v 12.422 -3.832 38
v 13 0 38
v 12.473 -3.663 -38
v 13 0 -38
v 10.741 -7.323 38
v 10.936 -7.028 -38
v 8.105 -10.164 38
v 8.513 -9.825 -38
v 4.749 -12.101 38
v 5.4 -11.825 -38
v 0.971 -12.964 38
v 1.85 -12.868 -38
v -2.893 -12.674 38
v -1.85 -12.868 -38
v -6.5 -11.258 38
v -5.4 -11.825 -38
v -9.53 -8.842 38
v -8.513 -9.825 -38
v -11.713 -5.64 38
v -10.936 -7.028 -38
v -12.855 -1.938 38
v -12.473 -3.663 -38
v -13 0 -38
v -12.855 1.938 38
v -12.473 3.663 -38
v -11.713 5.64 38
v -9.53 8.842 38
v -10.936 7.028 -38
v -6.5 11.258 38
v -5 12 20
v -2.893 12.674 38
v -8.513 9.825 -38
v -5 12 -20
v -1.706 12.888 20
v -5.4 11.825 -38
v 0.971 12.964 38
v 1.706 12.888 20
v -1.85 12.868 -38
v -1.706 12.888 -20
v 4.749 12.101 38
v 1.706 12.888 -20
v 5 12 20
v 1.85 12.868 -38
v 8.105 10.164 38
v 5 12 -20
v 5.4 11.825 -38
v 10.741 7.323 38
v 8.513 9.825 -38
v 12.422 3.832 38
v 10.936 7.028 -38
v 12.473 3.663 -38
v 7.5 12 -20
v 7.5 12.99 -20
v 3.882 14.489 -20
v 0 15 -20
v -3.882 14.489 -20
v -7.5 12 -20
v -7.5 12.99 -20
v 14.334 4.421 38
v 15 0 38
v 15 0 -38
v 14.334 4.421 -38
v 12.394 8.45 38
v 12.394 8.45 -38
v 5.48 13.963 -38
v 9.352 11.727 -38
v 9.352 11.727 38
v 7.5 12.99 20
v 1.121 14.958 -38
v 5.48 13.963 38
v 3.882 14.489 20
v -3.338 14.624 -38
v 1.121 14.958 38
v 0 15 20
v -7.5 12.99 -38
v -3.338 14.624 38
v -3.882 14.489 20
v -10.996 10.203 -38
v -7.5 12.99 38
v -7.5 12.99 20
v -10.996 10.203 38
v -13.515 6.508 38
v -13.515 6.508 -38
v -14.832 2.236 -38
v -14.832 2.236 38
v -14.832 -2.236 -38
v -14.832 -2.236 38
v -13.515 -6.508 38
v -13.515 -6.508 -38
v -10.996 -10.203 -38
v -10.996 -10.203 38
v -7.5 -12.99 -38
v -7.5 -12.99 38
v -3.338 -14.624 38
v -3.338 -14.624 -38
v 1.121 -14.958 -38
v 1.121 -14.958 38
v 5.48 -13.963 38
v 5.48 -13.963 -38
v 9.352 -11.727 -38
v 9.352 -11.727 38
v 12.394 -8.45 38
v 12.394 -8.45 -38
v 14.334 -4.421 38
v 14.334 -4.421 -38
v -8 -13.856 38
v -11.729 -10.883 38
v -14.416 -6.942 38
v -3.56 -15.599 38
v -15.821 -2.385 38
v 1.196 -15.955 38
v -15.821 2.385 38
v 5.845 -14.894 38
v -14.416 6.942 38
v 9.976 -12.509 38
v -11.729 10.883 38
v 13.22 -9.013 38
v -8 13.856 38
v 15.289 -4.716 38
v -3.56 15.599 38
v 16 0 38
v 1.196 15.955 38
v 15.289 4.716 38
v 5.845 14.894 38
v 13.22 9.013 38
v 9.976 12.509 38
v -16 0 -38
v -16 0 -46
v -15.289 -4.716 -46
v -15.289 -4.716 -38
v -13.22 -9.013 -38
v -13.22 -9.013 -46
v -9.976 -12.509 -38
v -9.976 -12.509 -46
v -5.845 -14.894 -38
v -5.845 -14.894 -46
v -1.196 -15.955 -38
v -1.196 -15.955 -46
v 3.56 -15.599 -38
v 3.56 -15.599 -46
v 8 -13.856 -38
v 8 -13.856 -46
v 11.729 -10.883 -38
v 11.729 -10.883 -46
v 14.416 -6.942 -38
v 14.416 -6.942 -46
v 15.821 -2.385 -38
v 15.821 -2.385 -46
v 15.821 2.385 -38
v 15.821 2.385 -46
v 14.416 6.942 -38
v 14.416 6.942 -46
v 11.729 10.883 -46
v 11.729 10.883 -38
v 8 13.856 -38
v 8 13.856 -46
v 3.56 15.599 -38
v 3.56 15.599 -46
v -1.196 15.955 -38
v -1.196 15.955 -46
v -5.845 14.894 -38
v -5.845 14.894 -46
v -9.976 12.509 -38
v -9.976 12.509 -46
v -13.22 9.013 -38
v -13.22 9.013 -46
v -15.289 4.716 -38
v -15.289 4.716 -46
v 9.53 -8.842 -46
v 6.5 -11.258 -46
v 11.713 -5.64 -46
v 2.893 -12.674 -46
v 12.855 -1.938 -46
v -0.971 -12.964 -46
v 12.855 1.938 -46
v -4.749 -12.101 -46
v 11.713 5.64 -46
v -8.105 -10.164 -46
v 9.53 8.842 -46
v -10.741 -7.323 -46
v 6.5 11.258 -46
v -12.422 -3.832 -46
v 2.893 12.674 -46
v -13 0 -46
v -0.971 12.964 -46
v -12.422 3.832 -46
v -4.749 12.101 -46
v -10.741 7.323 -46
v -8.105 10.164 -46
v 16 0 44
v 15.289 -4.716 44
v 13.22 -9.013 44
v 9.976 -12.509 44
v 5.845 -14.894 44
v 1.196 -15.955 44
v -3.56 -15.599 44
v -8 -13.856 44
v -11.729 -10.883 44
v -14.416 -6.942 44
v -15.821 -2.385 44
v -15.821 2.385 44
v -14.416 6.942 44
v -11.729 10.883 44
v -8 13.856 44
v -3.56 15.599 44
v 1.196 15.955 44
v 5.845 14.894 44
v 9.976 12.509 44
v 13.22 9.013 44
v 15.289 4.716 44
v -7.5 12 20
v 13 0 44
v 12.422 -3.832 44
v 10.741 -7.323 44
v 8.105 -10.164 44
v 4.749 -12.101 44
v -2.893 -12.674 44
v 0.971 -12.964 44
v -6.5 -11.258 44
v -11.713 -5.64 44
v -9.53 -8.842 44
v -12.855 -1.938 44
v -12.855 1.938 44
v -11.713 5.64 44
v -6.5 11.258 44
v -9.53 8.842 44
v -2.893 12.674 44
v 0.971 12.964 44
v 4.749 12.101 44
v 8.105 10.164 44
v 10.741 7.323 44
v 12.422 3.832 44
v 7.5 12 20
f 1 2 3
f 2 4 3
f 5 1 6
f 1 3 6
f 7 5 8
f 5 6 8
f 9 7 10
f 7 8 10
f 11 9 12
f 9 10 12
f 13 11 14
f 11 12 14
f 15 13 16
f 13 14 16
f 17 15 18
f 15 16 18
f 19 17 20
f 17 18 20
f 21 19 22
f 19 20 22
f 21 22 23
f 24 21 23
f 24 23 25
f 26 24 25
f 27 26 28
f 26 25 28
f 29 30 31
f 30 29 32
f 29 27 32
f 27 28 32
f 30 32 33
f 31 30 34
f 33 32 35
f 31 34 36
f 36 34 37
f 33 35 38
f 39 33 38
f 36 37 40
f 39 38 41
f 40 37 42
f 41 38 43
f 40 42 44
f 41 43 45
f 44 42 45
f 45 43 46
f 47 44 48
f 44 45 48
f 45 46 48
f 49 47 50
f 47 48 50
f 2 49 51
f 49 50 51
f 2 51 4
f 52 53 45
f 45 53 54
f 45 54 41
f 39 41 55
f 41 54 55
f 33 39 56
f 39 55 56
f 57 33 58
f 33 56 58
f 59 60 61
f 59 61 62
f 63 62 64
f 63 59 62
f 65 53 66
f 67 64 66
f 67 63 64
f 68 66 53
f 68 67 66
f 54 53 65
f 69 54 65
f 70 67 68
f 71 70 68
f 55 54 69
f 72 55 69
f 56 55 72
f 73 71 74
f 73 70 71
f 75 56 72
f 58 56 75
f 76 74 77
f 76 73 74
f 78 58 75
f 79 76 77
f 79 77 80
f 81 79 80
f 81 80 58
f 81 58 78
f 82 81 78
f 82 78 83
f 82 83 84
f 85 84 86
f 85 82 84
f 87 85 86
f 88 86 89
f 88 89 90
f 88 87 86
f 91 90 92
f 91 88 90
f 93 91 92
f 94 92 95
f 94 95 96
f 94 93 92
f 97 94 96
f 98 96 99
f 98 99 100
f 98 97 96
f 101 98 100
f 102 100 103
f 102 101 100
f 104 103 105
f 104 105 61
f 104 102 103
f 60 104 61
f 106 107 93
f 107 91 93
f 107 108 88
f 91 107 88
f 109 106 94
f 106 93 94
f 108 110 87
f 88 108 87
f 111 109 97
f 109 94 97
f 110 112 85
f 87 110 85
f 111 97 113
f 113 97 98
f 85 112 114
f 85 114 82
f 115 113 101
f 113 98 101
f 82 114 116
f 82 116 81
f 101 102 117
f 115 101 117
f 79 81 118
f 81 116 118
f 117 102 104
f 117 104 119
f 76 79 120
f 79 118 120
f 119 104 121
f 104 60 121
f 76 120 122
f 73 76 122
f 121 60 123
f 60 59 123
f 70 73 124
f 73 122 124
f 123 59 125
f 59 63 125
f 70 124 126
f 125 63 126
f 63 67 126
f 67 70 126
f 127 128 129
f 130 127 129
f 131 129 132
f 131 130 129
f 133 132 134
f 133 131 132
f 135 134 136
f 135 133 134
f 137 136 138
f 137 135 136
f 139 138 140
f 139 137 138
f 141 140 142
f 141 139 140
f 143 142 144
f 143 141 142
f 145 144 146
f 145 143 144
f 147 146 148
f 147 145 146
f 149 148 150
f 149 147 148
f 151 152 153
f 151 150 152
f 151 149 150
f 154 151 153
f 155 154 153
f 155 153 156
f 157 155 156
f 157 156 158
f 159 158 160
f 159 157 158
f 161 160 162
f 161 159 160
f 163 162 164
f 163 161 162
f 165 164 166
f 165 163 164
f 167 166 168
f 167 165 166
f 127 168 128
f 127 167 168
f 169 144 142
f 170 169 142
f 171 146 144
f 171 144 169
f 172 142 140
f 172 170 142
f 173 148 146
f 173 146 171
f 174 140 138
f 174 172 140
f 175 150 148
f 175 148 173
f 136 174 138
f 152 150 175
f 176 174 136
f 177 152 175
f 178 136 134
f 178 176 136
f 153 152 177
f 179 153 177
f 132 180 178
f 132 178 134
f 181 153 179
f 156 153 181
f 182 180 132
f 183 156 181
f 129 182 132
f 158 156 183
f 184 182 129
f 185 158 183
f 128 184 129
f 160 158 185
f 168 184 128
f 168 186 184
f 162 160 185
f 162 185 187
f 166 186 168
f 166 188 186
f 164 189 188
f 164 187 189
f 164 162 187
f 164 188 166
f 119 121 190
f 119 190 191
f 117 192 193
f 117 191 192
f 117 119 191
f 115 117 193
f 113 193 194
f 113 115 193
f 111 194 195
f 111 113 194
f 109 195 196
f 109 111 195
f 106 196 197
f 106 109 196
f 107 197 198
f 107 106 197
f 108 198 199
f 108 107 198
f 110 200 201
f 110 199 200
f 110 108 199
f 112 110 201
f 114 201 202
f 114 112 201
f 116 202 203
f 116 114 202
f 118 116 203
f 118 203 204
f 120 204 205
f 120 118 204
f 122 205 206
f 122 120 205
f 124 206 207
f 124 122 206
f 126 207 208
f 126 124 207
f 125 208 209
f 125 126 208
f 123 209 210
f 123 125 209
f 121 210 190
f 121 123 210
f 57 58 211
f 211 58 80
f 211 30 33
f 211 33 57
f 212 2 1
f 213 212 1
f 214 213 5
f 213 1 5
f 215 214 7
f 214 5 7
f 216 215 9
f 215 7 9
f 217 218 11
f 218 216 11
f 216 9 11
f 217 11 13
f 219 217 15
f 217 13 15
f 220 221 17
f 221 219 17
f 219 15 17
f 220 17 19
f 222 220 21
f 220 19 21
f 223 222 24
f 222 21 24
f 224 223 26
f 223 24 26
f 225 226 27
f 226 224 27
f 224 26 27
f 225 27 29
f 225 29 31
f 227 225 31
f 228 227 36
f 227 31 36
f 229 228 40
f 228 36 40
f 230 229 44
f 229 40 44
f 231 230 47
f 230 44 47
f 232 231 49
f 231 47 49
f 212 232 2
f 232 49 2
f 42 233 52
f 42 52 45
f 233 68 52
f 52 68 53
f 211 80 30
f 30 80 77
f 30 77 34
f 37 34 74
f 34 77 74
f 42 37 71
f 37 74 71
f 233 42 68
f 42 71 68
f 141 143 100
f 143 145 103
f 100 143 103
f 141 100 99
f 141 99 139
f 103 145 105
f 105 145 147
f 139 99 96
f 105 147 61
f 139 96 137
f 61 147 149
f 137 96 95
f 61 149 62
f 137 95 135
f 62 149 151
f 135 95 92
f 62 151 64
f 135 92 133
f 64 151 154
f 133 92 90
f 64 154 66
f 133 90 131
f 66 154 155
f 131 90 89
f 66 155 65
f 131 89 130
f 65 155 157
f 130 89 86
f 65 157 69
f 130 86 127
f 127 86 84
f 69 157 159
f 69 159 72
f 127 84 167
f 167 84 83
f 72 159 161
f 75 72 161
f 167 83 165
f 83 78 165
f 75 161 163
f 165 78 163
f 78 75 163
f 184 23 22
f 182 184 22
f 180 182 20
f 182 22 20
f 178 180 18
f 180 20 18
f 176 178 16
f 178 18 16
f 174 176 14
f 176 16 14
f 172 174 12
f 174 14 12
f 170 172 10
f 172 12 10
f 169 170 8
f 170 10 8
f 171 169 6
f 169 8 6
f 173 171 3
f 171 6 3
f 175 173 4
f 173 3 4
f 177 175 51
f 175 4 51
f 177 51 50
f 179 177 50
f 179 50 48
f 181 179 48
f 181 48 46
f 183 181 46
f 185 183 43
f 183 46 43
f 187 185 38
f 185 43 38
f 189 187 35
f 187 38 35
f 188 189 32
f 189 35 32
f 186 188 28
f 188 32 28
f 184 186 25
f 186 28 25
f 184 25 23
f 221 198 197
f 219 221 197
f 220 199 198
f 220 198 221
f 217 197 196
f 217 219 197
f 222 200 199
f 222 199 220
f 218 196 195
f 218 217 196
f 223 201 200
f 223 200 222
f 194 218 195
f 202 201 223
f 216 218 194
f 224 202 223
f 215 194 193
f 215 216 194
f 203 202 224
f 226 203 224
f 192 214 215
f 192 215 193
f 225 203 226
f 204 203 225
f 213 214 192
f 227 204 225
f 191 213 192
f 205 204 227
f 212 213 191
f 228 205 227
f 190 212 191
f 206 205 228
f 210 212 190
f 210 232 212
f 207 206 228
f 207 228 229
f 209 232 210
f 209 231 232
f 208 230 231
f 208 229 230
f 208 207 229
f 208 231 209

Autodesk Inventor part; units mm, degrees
ref_plane "YZ Plane" through (0, 0, 0) normal (1, 0, 0) x (0, 1, 0)
ref_plane "XY Plane" through (0, 0, 0) normal (0, 0, 1) x (1, 0, 0)
sketch "Sketch1" plane through (0, 0, 0) normal (0, 1, 0) x (-1, 0, 0)
  line L0 (-12.6, 0) -> (-15.4, 0) projected
  line L1 (0, -53.2) -> (0, 53.2) projected
  line L2 (-13, -38) -> (-15, -38)
  line L3 (-15, -38) -> (-15, 38)
  line L4 (-15, 38) -> (-13, 38)
  line L5 (-13, 38) -> (-13, -38)
  line L6 (-13, -38) -> (-15, 38) construction
  line L7 (-15, -38) -> (-13, 38) construction
  point P0 (-14, 0)
  dimension "d0" = 2
  dimension "d1" = 76
  dimension "d2" = 30
revolve "Revolution1" add sketch "Sketch1" angle 360 about axis through (0, 0, -10) along (0, 0, 1)
ref_plane "Work Plane1" through (0, 15, 0) normal (0, 1, 0) x (-1, 0, 0)
sketch "Sketch3" plane through (0, 15, 0) normal (0, 1, 0) x (-1, 0, 0)
  line L0 (-7.5, -20) -> (7.5, -20)
  line L1 (7.5, -20) -> (7.5, 20)
  line L2 (7.5, 20) -> (-7.5, 20)
  line L3 (-7.5, 20) -> (-7.5, -20)
  line L4 (-7.5, -20) -> (7.5, 20) construction
  line L5 (7.5, -20) -> (-7.5, 20) construction
  point P0 (0, 0)
  dimension "d4" = 15
  dimension "d5" = 40
extrude "Extrusion1" cut sketch "Sketch3" against normal blind 3
sketch "Sketch5" plane through (0, 0, -38) normal (0, 0, -1) x (-1, 0, 0)
  circle A0 centre (0, 0) radius 13
  circle A1 centre (0, 0) radius 16
  dimension "d8" = 32
  dimension "d9" = 26
extrude "Extrusion2" add sketch "Sketch5" along normal blind 8
sketch "Sketch6" plane through (0, 0, 38) normal (0, 0, 1) x (1, 0, 0)
  circle A0 centre (0, 0) radius 13
  circle A1 centre (0, 0) radius 16
  dimension "d12" = 26
  dimension "d13" = 32
extrude "Extrusion3" add sketch "Sketch6" along normal blind 6
properties part number "Handle bars holder axle"
